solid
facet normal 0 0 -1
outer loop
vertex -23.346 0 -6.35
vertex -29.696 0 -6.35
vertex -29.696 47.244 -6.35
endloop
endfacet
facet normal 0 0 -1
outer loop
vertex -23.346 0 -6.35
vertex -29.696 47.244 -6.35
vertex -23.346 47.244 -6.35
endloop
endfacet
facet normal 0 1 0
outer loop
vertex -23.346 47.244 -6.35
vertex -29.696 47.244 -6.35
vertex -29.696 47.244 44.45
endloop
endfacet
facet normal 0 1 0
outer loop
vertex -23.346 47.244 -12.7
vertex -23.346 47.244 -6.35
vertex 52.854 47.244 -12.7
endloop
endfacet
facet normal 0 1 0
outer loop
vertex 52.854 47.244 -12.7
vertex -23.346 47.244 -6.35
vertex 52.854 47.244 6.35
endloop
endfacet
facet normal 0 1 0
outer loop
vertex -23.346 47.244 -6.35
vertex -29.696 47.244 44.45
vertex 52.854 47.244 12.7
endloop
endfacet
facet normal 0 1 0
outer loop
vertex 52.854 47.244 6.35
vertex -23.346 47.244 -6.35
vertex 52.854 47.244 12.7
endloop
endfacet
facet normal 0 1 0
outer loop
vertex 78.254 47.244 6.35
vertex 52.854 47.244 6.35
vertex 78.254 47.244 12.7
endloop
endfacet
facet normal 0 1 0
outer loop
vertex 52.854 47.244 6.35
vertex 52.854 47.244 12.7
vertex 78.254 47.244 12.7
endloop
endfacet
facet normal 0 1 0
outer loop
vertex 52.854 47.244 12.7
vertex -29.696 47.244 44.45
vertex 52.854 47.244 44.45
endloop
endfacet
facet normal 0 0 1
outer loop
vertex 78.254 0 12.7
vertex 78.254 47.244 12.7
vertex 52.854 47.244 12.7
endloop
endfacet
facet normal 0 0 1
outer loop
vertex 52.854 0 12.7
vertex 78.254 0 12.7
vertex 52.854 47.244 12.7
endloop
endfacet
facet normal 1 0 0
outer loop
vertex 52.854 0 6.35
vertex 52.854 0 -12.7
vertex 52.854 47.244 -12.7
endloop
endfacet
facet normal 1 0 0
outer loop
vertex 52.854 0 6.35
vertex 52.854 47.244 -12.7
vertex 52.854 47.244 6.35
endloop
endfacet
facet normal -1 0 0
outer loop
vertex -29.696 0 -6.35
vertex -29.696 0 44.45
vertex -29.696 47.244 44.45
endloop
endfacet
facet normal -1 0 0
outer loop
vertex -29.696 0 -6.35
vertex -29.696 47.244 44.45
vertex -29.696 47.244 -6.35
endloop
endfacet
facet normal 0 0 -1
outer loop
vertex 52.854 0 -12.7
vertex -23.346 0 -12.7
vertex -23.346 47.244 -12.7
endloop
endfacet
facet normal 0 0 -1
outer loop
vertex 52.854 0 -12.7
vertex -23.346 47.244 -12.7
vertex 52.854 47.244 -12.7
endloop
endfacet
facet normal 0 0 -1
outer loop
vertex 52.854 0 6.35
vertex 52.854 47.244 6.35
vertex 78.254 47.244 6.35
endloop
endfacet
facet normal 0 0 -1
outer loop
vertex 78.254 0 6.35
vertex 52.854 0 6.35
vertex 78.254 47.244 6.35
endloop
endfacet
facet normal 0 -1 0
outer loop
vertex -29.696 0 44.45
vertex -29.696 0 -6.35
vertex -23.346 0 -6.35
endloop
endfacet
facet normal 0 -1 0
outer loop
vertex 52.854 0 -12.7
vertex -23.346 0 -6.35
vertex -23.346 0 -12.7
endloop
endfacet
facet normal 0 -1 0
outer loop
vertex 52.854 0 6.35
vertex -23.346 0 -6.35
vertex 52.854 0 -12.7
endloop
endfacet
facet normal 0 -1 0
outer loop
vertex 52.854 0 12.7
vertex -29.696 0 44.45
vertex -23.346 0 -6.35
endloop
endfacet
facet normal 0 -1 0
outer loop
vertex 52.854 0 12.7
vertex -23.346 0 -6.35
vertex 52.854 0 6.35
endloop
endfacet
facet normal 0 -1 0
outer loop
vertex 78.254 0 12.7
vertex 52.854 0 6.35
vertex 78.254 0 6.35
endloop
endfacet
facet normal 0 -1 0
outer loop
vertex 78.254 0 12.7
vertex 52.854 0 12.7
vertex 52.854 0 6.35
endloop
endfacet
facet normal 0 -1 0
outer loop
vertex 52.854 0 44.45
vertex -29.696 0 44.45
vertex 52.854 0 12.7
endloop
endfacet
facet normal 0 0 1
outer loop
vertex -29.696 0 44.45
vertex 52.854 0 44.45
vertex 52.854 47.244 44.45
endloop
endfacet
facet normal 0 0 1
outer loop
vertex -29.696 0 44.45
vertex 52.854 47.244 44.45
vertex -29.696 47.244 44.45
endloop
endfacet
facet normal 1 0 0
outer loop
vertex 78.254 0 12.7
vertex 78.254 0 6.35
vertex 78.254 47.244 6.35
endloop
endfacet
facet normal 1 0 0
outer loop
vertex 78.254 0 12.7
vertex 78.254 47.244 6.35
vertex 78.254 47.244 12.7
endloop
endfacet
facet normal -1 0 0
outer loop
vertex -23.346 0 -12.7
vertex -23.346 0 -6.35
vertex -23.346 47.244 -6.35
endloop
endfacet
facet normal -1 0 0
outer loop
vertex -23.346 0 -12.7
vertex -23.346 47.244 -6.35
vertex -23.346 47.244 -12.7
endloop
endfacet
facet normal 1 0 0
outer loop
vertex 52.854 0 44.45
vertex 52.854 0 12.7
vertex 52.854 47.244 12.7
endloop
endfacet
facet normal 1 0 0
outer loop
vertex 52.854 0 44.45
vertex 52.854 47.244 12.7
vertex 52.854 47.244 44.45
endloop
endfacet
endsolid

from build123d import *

# Parameters (mm, degrees)
F6_DEPTH = 47.244


# Not quite as in the source:
# - a feature of the source that left no trace in its solid (it failed there, or was rolled back) is left out


with BuildPart() as f6:
    # F0 (on Front) → F6 (new body)
    with BuildSketch(Plane.XZ):
        Polygon((52.8543624759, 44.45), (-29.6956375241, 44.45), (-29.6956375241, -6.35), (-23.3456375241, -6.35), (-23.3456375241, -12.7), (52.8543624759, -12.7), (52.8543624759, 6.35), (78.2543624759, 6.35), (78.2543624759, 12.7), (52.8543624759, 12.7), align=None)
    extrude(amount=-F6_DEPTH)


solid = f6.part
